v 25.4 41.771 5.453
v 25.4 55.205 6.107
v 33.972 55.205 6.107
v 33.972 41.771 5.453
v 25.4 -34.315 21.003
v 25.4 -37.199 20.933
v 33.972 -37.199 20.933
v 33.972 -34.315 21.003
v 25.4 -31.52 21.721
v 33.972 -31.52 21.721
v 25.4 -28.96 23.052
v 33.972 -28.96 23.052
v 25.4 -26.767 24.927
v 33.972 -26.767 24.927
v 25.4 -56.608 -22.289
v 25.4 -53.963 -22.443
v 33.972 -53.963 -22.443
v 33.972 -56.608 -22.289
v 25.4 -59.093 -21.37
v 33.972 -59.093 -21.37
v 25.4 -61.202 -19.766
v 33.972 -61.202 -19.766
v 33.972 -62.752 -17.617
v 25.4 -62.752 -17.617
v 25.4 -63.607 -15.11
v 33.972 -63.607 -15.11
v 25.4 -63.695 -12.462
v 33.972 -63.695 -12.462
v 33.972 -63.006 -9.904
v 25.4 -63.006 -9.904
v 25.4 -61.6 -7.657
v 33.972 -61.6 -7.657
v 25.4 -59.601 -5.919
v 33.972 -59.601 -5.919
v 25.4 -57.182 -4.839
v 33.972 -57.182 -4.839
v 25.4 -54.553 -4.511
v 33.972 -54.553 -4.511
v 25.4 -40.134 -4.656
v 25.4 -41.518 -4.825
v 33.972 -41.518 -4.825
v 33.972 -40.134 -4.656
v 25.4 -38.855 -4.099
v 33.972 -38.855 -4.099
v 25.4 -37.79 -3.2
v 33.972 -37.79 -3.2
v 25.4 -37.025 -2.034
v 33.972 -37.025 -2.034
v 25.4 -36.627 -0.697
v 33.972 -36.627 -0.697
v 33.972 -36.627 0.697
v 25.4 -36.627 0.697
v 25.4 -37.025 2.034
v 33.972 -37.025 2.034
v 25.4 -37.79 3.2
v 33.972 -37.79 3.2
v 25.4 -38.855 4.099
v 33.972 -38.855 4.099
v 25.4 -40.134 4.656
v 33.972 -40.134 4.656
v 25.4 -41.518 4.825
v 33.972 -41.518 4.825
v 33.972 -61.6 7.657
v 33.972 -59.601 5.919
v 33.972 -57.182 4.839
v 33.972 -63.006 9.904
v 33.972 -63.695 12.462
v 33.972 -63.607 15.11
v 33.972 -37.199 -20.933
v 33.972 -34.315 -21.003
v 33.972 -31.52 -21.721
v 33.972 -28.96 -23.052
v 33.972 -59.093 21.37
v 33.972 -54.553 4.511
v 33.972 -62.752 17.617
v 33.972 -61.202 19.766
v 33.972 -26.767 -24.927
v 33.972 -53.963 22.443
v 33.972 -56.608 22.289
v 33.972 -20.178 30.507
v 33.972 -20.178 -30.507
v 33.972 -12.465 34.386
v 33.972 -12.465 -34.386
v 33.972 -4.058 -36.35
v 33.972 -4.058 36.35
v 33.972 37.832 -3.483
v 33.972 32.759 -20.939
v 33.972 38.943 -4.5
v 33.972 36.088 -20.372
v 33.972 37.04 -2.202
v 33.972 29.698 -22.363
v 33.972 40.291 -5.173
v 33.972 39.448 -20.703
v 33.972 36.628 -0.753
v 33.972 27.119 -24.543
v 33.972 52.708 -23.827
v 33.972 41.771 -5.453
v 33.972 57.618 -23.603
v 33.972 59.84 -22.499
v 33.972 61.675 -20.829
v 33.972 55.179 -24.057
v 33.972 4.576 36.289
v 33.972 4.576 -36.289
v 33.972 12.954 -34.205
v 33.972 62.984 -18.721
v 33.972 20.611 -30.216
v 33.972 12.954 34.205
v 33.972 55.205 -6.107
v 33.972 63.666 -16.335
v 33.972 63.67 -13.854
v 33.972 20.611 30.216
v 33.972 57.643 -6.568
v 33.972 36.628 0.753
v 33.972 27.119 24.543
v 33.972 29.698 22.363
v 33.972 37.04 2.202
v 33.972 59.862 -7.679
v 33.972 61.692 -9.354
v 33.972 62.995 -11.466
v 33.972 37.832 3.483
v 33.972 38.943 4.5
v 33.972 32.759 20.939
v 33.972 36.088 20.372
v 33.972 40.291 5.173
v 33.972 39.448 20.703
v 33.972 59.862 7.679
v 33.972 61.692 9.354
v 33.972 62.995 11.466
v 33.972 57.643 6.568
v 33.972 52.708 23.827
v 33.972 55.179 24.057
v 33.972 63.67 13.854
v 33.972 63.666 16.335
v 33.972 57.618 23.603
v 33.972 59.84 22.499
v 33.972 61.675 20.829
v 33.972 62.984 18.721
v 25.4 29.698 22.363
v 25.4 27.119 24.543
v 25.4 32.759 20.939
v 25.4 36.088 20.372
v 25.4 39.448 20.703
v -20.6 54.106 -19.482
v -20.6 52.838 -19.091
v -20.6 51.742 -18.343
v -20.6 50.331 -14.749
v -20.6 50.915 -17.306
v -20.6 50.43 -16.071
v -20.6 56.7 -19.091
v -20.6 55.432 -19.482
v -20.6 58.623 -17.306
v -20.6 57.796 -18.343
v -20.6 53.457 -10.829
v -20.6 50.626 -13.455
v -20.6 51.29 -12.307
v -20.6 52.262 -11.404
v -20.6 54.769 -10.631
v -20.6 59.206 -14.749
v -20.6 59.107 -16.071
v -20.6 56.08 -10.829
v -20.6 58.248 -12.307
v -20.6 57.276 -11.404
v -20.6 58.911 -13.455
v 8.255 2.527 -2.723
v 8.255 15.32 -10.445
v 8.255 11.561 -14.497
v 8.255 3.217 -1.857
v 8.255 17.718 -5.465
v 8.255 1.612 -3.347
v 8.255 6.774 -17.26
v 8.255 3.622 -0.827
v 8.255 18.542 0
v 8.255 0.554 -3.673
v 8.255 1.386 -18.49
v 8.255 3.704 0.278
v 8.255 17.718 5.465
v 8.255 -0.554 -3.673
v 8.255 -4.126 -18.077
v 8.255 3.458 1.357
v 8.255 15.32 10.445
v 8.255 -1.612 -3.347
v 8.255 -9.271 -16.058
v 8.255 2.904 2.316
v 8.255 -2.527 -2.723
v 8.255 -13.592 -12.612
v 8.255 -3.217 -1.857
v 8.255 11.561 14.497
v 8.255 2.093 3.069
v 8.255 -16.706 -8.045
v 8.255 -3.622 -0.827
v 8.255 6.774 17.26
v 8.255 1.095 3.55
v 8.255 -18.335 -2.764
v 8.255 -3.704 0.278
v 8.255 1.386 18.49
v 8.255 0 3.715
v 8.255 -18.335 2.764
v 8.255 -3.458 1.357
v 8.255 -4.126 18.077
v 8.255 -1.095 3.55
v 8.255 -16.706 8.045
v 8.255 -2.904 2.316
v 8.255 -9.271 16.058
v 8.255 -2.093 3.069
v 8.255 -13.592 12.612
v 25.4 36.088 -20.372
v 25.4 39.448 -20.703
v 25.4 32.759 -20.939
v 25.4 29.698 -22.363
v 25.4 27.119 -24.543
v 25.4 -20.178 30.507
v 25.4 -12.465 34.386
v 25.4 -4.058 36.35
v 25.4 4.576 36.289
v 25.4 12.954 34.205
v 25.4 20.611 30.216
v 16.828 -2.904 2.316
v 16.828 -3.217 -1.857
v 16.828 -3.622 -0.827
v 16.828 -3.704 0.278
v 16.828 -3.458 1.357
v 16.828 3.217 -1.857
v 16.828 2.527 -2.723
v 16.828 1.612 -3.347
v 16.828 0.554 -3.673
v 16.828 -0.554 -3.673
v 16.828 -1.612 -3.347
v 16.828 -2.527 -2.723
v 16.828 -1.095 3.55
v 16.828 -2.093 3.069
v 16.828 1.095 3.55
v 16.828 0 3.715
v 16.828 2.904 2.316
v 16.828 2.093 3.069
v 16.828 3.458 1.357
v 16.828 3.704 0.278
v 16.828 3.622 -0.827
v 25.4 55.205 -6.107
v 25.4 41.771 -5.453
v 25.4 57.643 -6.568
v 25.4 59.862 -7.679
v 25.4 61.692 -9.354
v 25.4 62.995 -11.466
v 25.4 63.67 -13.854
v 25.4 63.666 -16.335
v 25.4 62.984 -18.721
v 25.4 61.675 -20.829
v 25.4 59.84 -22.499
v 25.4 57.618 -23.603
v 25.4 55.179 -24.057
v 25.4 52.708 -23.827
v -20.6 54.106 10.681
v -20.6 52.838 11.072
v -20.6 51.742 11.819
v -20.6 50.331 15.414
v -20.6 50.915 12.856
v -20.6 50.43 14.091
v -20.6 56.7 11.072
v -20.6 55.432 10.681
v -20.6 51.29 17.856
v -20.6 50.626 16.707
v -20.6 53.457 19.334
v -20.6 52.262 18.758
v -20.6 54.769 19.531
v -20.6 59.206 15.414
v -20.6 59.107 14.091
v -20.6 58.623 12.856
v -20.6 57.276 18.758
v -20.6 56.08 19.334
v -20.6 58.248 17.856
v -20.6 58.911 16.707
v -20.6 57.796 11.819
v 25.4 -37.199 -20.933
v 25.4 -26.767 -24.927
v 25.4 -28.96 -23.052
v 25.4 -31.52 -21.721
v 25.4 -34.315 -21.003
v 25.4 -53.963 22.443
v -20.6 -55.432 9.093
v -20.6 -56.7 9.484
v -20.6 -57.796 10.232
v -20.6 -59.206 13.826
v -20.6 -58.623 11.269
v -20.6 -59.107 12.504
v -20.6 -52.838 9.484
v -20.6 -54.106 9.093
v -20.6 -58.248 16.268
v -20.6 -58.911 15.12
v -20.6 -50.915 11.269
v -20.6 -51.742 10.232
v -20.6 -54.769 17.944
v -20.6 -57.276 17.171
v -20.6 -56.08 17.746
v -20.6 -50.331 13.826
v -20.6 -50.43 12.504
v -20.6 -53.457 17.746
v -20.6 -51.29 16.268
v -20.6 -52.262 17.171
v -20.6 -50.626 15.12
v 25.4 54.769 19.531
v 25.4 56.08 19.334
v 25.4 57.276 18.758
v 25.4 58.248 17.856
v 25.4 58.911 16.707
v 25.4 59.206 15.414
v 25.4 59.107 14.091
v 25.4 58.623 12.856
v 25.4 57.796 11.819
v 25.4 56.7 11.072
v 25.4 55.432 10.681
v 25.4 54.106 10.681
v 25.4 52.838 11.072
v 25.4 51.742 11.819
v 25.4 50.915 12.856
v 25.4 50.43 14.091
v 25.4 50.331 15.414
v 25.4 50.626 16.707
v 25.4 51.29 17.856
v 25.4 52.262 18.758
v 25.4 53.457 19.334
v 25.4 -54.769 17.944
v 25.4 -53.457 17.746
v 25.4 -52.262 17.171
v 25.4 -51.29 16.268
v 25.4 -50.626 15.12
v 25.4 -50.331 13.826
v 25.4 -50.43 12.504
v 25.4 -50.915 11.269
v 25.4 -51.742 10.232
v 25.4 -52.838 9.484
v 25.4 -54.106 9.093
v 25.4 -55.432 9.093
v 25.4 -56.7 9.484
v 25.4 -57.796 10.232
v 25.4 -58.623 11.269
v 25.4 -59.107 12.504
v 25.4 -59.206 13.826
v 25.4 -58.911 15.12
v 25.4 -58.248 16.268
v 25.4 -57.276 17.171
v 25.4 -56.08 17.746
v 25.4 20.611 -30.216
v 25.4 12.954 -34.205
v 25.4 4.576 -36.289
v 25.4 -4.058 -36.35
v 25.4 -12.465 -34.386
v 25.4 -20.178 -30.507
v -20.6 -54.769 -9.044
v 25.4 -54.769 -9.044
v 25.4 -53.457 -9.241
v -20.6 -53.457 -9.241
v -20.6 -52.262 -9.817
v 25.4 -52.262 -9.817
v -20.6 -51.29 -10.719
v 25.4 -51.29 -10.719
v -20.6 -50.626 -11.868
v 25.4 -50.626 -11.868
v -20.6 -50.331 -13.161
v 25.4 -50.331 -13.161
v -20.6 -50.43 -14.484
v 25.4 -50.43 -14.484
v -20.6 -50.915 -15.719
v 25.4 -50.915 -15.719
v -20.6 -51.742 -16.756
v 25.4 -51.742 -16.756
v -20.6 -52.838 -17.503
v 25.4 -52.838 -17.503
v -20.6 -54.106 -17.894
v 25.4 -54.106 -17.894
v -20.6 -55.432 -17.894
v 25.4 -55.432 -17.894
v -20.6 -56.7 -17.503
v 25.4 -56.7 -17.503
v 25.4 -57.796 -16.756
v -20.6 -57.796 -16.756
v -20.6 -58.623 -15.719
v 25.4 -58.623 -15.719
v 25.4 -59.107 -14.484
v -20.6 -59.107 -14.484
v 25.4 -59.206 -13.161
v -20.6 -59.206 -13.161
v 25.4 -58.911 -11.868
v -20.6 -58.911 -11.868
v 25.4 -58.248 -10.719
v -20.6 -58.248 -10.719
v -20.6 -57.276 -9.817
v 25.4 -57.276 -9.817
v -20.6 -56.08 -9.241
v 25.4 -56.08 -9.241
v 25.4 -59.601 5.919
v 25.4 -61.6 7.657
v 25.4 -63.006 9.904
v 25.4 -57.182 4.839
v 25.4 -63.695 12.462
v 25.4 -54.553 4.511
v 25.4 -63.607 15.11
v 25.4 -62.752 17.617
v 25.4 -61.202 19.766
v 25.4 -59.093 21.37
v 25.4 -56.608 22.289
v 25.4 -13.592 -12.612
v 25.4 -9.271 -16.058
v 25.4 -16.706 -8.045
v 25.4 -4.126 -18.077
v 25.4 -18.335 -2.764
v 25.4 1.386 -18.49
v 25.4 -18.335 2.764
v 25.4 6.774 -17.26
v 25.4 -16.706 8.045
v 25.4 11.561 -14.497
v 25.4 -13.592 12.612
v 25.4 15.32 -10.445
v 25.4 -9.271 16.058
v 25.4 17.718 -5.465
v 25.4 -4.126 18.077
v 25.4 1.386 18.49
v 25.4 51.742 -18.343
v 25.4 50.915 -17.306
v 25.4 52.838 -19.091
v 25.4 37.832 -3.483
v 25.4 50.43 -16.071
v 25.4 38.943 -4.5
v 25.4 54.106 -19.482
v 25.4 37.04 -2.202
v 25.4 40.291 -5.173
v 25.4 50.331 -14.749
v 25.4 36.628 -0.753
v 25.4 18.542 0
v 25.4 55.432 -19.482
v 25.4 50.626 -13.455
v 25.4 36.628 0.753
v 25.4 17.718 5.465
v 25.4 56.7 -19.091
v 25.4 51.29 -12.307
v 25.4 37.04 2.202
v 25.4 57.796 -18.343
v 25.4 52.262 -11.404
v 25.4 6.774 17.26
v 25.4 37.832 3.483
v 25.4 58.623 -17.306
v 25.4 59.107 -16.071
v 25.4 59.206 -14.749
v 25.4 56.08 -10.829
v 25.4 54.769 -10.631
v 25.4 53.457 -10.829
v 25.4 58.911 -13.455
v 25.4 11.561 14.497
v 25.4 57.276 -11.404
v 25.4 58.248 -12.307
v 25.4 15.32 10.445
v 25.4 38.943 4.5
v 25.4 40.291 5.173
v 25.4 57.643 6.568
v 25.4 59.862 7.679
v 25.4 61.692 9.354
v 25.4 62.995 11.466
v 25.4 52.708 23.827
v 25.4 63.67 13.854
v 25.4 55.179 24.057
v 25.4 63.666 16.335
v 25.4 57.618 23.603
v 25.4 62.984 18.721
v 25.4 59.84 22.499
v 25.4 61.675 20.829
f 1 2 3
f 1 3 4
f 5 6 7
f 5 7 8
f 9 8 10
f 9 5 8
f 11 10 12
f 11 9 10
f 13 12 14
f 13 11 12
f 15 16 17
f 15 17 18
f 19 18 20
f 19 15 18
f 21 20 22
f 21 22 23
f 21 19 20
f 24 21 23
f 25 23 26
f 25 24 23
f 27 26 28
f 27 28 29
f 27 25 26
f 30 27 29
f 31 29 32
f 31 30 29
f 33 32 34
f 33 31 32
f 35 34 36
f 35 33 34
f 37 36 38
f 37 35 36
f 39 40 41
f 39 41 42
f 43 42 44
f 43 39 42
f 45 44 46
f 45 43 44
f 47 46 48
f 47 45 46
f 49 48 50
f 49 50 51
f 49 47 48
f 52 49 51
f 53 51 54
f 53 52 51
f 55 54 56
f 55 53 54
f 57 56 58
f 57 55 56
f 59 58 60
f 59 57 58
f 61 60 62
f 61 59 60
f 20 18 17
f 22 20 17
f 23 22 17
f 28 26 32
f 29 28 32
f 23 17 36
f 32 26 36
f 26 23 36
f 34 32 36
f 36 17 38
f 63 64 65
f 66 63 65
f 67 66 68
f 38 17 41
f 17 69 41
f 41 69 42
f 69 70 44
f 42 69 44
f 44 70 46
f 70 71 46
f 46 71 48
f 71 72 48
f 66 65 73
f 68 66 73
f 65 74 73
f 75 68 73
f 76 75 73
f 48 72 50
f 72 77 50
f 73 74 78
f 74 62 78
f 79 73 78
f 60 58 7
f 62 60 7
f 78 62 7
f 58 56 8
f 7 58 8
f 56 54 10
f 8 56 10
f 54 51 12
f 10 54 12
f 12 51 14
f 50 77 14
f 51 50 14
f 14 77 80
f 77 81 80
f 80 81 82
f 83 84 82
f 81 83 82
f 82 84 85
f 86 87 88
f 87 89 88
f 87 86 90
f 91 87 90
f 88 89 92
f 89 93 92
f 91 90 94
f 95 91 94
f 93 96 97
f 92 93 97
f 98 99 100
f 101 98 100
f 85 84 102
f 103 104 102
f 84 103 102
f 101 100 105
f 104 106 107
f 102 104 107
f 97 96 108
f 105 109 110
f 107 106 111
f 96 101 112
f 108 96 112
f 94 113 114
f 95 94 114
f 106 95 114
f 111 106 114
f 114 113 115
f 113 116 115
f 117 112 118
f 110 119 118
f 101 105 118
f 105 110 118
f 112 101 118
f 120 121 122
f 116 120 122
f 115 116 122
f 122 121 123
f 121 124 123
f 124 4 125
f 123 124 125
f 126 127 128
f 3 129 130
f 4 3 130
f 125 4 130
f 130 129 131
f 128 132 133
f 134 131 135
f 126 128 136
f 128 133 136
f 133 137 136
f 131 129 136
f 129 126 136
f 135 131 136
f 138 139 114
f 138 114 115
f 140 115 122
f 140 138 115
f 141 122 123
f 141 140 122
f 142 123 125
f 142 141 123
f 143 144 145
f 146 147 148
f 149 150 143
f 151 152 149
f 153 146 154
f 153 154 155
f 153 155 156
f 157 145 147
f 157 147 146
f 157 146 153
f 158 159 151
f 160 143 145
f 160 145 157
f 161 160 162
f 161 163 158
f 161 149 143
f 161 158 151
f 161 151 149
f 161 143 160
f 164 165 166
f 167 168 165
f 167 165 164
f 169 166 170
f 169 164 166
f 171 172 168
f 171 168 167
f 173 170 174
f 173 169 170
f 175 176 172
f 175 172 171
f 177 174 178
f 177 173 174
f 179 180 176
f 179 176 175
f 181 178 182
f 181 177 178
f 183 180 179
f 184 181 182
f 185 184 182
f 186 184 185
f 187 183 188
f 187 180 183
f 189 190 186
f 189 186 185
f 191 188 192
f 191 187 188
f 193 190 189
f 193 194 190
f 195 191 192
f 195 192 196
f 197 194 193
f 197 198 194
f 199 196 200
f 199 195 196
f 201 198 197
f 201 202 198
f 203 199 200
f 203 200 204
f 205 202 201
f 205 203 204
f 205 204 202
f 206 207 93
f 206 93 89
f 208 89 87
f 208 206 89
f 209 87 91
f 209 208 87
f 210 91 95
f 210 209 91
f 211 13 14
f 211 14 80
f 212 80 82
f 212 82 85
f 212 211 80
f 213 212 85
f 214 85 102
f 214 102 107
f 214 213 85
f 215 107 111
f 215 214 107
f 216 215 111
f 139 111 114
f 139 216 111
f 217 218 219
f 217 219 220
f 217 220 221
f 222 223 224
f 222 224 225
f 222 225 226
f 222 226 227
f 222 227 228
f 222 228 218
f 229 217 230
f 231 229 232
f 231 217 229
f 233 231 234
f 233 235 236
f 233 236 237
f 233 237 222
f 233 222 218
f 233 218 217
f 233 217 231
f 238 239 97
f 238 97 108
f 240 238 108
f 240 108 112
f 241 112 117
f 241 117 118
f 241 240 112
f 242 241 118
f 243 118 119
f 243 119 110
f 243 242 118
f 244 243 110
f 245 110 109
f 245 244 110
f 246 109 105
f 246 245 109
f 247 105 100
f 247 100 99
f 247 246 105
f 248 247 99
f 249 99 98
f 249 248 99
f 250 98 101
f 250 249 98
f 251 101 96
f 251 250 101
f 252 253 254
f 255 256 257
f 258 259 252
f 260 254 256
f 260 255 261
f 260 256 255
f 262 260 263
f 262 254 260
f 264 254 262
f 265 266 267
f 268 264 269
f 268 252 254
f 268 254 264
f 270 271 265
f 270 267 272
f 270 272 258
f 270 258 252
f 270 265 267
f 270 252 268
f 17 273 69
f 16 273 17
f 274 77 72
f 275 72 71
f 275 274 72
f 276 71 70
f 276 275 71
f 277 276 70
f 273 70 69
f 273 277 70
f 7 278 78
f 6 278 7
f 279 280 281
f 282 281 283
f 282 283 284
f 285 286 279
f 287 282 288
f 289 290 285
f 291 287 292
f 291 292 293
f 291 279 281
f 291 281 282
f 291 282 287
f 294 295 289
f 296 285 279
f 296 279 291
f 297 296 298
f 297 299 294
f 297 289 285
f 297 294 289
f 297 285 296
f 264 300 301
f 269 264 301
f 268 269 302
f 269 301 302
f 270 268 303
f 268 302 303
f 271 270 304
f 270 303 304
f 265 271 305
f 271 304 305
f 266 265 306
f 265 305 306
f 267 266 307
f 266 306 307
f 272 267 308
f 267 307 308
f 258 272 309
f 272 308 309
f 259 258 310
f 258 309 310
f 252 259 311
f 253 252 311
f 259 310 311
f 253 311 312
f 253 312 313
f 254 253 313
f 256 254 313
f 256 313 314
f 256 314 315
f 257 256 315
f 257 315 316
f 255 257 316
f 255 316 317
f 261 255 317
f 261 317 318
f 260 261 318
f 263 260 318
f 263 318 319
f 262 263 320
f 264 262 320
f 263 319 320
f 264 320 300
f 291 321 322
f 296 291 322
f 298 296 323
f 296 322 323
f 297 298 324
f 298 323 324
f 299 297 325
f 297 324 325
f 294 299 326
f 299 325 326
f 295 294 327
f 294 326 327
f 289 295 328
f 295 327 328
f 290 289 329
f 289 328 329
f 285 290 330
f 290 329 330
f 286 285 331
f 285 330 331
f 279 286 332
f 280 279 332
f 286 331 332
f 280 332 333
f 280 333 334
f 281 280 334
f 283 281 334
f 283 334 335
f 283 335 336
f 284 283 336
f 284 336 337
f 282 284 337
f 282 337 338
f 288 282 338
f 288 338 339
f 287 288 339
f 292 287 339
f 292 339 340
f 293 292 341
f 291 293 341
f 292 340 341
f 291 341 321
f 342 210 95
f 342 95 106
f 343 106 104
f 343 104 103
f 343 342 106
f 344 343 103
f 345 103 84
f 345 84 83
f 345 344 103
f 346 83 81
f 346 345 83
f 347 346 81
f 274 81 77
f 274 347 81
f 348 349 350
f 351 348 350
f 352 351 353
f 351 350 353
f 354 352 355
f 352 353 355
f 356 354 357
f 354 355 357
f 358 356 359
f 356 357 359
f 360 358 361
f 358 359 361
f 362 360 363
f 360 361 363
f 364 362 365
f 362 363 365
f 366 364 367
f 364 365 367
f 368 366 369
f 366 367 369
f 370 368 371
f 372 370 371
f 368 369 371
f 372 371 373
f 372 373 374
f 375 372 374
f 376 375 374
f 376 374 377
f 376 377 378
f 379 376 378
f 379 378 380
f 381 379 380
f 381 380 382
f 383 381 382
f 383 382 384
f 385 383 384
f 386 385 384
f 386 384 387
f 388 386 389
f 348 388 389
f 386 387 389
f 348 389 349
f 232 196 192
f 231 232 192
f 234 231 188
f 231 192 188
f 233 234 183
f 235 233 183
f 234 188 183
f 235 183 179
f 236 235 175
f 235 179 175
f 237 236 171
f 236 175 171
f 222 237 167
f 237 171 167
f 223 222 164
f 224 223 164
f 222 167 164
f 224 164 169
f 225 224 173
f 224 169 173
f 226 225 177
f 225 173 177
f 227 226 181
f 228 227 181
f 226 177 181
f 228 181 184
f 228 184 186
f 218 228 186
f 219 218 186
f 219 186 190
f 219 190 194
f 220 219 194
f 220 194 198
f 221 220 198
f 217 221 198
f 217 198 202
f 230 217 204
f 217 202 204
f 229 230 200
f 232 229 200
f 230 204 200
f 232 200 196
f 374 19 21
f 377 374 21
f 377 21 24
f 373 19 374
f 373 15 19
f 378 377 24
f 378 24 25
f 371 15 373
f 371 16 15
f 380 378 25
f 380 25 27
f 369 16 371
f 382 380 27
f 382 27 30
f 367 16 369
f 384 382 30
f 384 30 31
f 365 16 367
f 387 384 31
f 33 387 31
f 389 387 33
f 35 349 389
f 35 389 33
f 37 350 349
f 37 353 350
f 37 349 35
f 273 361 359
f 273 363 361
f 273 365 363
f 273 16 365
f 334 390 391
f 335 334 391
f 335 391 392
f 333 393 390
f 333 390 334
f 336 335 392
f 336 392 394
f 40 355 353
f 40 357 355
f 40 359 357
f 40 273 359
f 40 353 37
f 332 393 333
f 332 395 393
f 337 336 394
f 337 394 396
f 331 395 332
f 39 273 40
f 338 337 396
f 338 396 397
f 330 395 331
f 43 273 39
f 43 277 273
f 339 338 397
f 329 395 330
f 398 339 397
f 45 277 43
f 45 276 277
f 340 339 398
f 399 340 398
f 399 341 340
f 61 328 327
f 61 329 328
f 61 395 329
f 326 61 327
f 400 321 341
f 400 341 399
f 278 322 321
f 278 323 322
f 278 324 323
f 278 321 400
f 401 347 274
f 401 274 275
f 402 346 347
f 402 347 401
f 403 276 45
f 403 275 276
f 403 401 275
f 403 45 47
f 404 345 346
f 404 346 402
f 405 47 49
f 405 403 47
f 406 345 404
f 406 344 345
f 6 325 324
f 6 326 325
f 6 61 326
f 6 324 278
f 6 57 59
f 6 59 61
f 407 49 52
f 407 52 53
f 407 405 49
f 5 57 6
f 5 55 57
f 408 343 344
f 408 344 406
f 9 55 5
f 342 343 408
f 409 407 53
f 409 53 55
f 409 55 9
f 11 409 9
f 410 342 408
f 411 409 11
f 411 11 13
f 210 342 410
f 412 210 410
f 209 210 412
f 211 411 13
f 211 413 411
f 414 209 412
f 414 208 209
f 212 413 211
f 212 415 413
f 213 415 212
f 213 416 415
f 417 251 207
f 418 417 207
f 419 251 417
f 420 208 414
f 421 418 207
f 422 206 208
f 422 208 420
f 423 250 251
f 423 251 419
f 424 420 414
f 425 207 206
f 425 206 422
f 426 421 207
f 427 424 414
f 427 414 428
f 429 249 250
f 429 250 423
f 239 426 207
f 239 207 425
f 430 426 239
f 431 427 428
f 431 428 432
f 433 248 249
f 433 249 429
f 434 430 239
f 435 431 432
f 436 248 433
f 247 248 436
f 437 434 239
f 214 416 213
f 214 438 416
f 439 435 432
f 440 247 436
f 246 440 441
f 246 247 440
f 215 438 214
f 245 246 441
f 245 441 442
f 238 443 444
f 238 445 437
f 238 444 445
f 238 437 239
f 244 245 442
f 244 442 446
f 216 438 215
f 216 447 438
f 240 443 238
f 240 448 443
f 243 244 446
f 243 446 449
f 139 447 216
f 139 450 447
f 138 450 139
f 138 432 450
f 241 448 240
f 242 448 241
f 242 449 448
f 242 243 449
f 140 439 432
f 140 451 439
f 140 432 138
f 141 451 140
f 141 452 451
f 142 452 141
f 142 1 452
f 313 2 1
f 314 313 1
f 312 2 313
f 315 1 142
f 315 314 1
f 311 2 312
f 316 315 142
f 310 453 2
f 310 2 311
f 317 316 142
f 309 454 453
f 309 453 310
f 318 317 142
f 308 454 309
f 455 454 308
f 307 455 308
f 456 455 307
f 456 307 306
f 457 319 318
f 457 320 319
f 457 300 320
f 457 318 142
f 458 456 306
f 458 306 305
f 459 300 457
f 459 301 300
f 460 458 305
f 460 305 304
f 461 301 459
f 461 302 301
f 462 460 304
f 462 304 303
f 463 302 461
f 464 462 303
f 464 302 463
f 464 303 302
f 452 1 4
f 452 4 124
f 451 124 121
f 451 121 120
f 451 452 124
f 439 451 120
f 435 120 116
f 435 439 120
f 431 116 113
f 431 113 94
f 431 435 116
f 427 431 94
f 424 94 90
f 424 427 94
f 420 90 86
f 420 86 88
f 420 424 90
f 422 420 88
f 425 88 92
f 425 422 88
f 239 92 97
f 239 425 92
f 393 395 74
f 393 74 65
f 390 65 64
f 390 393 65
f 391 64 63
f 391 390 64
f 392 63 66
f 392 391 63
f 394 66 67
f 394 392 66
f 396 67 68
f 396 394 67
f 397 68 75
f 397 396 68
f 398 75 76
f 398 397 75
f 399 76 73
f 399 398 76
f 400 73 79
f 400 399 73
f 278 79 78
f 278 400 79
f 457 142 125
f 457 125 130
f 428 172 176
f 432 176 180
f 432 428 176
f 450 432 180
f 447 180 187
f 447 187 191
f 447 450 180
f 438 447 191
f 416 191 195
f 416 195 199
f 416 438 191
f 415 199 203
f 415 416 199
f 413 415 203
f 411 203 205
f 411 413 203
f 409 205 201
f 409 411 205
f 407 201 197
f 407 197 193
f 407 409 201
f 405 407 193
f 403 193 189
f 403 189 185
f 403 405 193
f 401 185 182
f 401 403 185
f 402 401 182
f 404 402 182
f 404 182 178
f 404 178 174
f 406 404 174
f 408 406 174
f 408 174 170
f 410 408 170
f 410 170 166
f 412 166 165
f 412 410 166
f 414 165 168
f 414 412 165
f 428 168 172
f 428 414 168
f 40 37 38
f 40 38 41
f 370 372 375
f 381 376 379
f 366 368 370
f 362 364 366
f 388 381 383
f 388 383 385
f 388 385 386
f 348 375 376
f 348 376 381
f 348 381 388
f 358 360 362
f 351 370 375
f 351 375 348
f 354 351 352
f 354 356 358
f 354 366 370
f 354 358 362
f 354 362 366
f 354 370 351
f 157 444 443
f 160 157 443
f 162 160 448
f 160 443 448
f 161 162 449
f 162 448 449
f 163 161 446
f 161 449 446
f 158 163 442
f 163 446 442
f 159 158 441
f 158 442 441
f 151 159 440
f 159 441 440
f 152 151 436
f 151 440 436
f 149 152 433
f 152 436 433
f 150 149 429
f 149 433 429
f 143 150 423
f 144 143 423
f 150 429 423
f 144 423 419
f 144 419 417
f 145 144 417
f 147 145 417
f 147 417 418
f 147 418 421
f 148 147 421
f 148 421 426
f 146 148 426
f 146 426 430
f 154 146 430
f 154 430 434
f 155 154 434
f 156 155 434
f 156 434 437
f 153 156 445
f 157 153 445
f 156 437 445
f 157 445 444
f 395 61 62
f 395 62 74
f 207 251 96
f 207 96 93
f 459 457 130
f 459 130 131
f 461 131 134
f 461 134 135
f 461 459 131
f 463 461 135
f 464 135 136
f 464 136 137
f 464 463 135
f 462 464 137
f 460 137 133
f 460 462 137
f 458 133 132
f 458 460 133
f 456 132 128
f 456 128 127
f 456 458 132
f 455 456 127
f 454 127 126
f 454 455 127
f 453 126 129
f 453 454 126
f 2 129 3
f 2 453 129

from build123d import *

# Parameters (mm, degrees)
SKETCH1_W           = 17.145
SKETCH1_H           = 18.542
SKETCH2_R           = 3.71475
CUT_EXTRUDE1_DEPTH  = 8.5725
BOSS_EXTRUDE1_DEPTH = 8.5725
SKETCH4_R           = 4.45
BOSS_EXTRUDE3_DEPTH = 46


with BuildPart() as part:
    # Sketch1 → Revolve1 (revolve)
    with BuildSketch(Plane.XY):
        with Locations((16.8275, 9.271)):
            Rectangle(SKETCH1_W, SKETCH1_H)
    revolve(axis=Axis((8.255, 0, 0), (1, 0, 0)))

    # Sketch2 → Cut-Extrude1 (cut)
    with BuildSketch(Plane.ZY.offset(-8.255)):
        Circle(SKETCH2_R)
    extrude(amount=-CUT_EXTRUDE1_DEPTH, mode=Mode.SUBTRACT)

    # Sketch3 → Boss-Extrude1 (add)
    with BuildSketch(Plane(origin=(25.4, 0, 0), x_dir=(0, 0, -1), z_dir=(1, 0, 0))):
        with BuildLine():
            Line((-20.702899344, 39.448323668), (-23.827032985, 52.708168154))
            ThreePointArc((-23.827032985, 52.708168154), (-16.334994998, 63.666100226), (-6.106605949, 55.205192121))
            Line((-6.106605949, 55.205192121), (-5.453270033, 41.770518865))
            ThreePointArc((-5.453270033, 41.770518865), (0, 36.576), (5.453270033, 41.770518865))
            Line((5.453270033, 41.770518865), (6.106605949, 55.205192121))
            ThreePointArc((6.106605949, 55.205192121), (16.334994998, 63.666100226), (23.827032985, 52.708168154))
            Line((23.827032985, 52.708168154), (20.702899344, 39.448323668))
            ThreePointArc((20.702899344, 39.448323668), (20.938893682, 32.759417922), (24.542669739, 27.119386757))
            ThreePointArc((24.542669739, 27.119386757), (36.575069792, 0.260855666), (24.926987696, -26.766566093))
            ThreePointArc((24.926987696, -26.766566093), (21.721471464, -31.520323876), (20.93336456, -37.199446597))
            Line((20.93336456, -37.199446597), (22.442795242, -53.962954235))
            ThreePointArc((22.442795242, -53.962954235), (13.789101844, -63.749144471), (4.511097805, -54.552701147))
            Line((4.511097805, -54.552701147), (4.824604712, -41.518040373))
            ThreePointArc((4.824604712, -41.518040373), (0, -36.576), (-4.824604712, -41.518040373))
            Line((-4.824604712, -41.518040373), (-4.511097805, -54.552701147))
            ThreePointArc((-4.511097805, -54.552701147), (-13.789101844, -63.749144471), (-22.442795242, -53.962954235))
            Line((-22.442795242, -53.962954235), (-20.93336456, -37.199446597))
            ThreePointArc((-20.93336456, -37.199446597), (-21.721471464, -31.520323876), (-24.926987696, -26.766566093))
            ThreePointArc((-24.926987696, -26.766566093), (-36.575069792, 0.260855666), (-24.542669739, 27.119386757))
            ThreePointArc((-24.542669739, 27.119386757), (-20.938893682, 32.759417922), (-20.702899344, 39.448323668))
        make_face()
    extrude(amount=BOSS_EXTRUDE1_DEPTH)

    # Sketch4 → Boss-Extrude3 (add)
    with BuildSketch(Plane.ZY.offset(-25.4)):
        with Locations((-15.08125, 54.76875)):
            Circle(SKETCH4_R)
        with Locations((15.08125, 54.76875)):
            Circle(SKETCH4_R)
        with Locations((-13.49375, -54.76875)):
            Circle(SKETCH4_R)
        with Locations((13.49375, -54.76875)):
            Circle(SKETCH4_R)
    extrude(amount=BOSS_EXTRUDE3_DEPTH)


solid = part.part
